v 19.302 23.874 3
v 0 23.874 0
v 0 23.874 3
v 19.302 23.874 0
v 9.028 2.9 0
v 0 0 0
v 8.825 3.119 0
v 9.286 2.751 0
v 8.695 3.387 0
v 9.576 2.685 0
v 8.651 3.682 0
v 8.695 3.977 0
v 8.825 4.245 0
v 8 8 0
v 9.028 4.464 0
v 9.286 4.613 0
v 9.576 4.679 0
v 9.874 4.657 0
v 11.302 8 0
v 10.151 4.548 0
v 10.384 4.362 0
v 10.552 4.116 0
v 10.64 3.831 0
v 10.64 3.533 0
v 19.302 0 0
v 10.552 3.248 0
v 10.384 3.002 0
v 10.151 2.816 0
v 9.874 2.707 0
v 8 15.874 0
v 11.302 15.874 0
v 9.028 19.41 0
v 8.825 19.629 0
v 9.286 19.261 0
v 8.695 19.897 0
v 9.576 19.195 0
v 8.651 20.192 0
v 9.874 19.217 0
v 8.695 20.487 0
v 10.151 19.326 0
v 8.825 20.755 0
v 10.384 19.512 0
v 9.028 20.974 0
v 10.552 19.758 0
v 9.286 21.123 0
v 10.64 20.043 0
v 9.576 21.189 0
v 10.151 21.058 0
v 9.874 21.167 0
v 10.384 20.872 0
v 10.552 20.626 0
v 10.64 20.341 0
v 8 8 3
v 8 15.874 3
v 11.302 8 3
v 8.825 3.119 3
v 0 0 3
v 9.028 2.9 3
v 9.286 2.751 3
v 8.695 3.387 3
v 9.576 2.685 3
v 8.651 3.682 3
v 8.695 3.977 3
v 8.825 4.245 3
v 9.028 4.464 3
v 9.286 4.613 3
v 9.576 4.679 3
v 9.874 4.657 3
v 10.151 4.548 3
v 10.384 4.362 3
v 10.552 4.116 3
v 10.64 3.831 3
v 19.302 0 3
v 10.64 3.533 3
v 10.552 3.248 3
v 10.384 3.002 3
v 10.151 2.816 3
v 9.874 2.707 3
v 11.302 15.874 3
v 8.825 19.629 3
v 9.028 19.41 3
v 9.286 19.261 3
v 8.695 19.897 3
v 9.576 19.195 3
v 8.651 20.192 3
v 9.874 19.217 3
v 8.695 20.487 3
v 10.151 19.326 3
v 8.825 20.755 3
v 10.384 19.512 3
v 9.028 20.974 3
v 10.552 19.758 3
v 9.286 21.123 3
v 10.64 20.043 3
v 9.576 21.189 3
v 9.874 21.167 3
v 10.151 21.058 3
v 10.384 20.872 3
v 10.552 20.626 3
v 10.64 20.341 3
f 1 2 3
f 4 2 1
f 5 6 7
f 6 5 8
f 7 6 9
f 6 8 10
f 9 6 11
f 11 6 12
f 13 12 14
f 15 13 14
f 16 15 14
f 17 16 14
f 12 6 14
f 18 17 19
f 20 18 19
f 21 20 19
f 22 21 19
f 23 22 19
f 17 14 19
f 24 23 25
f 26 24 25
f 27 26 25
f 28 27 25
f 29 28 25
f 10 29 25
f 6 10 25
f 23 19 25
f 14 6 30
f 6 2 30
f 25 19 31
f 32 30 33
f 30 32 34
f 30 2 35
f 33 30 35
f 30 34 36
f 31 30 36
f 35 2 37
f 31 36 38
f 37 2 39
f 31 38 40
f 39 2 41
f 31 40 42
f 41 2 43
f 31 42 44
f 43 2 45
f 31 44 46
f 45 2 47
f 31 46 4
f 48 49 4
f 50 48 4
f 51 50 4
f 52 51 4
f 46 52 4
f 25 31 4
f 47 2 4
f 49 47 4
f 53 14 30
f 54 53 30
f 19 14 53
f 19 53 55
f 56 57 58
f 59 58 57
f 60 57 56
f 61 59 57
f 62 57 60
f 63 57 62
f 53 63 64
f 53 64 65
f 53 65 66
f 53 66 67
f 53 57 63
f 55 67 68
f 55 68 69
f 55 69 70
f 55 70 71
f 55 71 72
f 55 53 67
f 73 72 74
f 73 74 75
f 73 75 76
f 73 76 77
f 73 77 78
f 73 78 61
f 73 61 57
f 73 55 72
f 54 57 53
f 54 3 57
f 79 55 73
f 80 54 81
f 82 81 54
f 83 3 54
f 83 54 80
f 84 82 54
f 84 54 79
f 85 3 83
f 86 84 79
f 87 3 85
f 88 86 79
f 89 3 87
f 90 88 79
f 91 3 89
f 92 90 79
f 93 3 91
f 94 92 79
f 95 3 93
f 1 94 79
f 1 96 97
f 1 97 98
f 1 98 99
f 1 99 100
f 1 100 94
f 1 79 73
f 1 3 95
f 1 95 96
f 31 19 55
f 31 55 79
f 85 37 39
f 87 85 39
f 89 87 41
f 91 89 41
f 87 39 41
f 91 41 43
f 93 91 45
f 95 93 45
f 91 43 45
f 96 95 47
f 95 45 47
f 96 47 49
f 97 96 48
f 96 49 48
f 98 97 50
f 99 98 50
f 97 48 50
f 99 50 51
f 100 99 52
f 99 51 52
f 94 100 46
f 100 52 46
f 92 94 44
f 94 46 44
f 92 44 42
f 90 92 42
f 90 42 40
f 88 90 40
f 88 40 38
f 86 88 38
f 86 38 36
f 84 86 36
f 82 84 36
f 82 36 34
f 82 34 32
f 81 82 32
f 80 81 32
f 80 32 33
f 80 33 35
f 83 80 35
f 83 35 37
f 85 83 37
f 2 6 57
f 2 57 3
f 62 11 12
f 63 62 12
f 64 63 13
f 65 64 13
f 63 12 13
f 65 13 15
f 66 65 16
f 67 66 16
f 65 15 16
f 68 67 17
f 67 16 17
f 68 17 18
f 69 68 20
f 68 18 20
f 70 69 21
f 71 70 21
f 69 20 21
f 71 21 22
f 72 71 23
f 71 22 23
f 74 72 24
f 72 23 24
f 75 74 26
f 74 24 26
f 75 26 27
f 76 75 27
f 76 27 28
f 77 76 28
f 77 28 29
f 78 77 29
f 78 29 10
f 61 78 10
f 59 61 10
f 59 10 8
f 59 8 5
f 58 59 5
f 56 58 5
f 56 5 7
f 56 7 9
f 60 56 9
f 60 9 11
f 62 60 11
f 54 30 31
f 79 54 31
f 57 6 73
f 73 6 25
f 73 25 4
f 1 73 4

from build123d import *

# Parameters (mm, degrees)
SKETCH1_W           = 19.302
SKETCH1_H           = 23.874
SKETCH1_W_2         = 3.302
SKETCH1_H_2         = 7.874
BOSS_EXTRUDE1_DEPTH = 3
SKETCH3_R           = 1
CUT_EXTRUDE1_DEPTH  = 4


with BuildPart() as part:
    # Sketch1 → Boss-Extrude1 (new body)
    with BuildSketch(Plane.XY):
        with Locations((9.651, 11.937)):
            Rectangle(SKETCH1_W, SKETCH1_H)
        with Locations((9.651, 11.937)):
            Rectangle(SKETCH1_W_2, SKETCH1_H_2, mode=Mode.SUBTRACT)
    extrude(amount=BOSS_EXTRUDE1_DEPTH)

    # Sketch3 → Cut-Extrude1 (cut, through all)
    with BuildSketch(Plane(origin=(0, 0, 0), x_dir=(-1, 0, 0), z_dir=(0, 0, -1))):
        with Locations((-9.651, 20.192)):
            Circle(SKETCH3_R)
        with Locations((-9.651, 3.682)):
            Circle(SKETCH3_R)
    extrude(amount=-CUT_EXTRUDE1_DEPTH, mode=Mode.SUBTRACT)


solid = part.part
